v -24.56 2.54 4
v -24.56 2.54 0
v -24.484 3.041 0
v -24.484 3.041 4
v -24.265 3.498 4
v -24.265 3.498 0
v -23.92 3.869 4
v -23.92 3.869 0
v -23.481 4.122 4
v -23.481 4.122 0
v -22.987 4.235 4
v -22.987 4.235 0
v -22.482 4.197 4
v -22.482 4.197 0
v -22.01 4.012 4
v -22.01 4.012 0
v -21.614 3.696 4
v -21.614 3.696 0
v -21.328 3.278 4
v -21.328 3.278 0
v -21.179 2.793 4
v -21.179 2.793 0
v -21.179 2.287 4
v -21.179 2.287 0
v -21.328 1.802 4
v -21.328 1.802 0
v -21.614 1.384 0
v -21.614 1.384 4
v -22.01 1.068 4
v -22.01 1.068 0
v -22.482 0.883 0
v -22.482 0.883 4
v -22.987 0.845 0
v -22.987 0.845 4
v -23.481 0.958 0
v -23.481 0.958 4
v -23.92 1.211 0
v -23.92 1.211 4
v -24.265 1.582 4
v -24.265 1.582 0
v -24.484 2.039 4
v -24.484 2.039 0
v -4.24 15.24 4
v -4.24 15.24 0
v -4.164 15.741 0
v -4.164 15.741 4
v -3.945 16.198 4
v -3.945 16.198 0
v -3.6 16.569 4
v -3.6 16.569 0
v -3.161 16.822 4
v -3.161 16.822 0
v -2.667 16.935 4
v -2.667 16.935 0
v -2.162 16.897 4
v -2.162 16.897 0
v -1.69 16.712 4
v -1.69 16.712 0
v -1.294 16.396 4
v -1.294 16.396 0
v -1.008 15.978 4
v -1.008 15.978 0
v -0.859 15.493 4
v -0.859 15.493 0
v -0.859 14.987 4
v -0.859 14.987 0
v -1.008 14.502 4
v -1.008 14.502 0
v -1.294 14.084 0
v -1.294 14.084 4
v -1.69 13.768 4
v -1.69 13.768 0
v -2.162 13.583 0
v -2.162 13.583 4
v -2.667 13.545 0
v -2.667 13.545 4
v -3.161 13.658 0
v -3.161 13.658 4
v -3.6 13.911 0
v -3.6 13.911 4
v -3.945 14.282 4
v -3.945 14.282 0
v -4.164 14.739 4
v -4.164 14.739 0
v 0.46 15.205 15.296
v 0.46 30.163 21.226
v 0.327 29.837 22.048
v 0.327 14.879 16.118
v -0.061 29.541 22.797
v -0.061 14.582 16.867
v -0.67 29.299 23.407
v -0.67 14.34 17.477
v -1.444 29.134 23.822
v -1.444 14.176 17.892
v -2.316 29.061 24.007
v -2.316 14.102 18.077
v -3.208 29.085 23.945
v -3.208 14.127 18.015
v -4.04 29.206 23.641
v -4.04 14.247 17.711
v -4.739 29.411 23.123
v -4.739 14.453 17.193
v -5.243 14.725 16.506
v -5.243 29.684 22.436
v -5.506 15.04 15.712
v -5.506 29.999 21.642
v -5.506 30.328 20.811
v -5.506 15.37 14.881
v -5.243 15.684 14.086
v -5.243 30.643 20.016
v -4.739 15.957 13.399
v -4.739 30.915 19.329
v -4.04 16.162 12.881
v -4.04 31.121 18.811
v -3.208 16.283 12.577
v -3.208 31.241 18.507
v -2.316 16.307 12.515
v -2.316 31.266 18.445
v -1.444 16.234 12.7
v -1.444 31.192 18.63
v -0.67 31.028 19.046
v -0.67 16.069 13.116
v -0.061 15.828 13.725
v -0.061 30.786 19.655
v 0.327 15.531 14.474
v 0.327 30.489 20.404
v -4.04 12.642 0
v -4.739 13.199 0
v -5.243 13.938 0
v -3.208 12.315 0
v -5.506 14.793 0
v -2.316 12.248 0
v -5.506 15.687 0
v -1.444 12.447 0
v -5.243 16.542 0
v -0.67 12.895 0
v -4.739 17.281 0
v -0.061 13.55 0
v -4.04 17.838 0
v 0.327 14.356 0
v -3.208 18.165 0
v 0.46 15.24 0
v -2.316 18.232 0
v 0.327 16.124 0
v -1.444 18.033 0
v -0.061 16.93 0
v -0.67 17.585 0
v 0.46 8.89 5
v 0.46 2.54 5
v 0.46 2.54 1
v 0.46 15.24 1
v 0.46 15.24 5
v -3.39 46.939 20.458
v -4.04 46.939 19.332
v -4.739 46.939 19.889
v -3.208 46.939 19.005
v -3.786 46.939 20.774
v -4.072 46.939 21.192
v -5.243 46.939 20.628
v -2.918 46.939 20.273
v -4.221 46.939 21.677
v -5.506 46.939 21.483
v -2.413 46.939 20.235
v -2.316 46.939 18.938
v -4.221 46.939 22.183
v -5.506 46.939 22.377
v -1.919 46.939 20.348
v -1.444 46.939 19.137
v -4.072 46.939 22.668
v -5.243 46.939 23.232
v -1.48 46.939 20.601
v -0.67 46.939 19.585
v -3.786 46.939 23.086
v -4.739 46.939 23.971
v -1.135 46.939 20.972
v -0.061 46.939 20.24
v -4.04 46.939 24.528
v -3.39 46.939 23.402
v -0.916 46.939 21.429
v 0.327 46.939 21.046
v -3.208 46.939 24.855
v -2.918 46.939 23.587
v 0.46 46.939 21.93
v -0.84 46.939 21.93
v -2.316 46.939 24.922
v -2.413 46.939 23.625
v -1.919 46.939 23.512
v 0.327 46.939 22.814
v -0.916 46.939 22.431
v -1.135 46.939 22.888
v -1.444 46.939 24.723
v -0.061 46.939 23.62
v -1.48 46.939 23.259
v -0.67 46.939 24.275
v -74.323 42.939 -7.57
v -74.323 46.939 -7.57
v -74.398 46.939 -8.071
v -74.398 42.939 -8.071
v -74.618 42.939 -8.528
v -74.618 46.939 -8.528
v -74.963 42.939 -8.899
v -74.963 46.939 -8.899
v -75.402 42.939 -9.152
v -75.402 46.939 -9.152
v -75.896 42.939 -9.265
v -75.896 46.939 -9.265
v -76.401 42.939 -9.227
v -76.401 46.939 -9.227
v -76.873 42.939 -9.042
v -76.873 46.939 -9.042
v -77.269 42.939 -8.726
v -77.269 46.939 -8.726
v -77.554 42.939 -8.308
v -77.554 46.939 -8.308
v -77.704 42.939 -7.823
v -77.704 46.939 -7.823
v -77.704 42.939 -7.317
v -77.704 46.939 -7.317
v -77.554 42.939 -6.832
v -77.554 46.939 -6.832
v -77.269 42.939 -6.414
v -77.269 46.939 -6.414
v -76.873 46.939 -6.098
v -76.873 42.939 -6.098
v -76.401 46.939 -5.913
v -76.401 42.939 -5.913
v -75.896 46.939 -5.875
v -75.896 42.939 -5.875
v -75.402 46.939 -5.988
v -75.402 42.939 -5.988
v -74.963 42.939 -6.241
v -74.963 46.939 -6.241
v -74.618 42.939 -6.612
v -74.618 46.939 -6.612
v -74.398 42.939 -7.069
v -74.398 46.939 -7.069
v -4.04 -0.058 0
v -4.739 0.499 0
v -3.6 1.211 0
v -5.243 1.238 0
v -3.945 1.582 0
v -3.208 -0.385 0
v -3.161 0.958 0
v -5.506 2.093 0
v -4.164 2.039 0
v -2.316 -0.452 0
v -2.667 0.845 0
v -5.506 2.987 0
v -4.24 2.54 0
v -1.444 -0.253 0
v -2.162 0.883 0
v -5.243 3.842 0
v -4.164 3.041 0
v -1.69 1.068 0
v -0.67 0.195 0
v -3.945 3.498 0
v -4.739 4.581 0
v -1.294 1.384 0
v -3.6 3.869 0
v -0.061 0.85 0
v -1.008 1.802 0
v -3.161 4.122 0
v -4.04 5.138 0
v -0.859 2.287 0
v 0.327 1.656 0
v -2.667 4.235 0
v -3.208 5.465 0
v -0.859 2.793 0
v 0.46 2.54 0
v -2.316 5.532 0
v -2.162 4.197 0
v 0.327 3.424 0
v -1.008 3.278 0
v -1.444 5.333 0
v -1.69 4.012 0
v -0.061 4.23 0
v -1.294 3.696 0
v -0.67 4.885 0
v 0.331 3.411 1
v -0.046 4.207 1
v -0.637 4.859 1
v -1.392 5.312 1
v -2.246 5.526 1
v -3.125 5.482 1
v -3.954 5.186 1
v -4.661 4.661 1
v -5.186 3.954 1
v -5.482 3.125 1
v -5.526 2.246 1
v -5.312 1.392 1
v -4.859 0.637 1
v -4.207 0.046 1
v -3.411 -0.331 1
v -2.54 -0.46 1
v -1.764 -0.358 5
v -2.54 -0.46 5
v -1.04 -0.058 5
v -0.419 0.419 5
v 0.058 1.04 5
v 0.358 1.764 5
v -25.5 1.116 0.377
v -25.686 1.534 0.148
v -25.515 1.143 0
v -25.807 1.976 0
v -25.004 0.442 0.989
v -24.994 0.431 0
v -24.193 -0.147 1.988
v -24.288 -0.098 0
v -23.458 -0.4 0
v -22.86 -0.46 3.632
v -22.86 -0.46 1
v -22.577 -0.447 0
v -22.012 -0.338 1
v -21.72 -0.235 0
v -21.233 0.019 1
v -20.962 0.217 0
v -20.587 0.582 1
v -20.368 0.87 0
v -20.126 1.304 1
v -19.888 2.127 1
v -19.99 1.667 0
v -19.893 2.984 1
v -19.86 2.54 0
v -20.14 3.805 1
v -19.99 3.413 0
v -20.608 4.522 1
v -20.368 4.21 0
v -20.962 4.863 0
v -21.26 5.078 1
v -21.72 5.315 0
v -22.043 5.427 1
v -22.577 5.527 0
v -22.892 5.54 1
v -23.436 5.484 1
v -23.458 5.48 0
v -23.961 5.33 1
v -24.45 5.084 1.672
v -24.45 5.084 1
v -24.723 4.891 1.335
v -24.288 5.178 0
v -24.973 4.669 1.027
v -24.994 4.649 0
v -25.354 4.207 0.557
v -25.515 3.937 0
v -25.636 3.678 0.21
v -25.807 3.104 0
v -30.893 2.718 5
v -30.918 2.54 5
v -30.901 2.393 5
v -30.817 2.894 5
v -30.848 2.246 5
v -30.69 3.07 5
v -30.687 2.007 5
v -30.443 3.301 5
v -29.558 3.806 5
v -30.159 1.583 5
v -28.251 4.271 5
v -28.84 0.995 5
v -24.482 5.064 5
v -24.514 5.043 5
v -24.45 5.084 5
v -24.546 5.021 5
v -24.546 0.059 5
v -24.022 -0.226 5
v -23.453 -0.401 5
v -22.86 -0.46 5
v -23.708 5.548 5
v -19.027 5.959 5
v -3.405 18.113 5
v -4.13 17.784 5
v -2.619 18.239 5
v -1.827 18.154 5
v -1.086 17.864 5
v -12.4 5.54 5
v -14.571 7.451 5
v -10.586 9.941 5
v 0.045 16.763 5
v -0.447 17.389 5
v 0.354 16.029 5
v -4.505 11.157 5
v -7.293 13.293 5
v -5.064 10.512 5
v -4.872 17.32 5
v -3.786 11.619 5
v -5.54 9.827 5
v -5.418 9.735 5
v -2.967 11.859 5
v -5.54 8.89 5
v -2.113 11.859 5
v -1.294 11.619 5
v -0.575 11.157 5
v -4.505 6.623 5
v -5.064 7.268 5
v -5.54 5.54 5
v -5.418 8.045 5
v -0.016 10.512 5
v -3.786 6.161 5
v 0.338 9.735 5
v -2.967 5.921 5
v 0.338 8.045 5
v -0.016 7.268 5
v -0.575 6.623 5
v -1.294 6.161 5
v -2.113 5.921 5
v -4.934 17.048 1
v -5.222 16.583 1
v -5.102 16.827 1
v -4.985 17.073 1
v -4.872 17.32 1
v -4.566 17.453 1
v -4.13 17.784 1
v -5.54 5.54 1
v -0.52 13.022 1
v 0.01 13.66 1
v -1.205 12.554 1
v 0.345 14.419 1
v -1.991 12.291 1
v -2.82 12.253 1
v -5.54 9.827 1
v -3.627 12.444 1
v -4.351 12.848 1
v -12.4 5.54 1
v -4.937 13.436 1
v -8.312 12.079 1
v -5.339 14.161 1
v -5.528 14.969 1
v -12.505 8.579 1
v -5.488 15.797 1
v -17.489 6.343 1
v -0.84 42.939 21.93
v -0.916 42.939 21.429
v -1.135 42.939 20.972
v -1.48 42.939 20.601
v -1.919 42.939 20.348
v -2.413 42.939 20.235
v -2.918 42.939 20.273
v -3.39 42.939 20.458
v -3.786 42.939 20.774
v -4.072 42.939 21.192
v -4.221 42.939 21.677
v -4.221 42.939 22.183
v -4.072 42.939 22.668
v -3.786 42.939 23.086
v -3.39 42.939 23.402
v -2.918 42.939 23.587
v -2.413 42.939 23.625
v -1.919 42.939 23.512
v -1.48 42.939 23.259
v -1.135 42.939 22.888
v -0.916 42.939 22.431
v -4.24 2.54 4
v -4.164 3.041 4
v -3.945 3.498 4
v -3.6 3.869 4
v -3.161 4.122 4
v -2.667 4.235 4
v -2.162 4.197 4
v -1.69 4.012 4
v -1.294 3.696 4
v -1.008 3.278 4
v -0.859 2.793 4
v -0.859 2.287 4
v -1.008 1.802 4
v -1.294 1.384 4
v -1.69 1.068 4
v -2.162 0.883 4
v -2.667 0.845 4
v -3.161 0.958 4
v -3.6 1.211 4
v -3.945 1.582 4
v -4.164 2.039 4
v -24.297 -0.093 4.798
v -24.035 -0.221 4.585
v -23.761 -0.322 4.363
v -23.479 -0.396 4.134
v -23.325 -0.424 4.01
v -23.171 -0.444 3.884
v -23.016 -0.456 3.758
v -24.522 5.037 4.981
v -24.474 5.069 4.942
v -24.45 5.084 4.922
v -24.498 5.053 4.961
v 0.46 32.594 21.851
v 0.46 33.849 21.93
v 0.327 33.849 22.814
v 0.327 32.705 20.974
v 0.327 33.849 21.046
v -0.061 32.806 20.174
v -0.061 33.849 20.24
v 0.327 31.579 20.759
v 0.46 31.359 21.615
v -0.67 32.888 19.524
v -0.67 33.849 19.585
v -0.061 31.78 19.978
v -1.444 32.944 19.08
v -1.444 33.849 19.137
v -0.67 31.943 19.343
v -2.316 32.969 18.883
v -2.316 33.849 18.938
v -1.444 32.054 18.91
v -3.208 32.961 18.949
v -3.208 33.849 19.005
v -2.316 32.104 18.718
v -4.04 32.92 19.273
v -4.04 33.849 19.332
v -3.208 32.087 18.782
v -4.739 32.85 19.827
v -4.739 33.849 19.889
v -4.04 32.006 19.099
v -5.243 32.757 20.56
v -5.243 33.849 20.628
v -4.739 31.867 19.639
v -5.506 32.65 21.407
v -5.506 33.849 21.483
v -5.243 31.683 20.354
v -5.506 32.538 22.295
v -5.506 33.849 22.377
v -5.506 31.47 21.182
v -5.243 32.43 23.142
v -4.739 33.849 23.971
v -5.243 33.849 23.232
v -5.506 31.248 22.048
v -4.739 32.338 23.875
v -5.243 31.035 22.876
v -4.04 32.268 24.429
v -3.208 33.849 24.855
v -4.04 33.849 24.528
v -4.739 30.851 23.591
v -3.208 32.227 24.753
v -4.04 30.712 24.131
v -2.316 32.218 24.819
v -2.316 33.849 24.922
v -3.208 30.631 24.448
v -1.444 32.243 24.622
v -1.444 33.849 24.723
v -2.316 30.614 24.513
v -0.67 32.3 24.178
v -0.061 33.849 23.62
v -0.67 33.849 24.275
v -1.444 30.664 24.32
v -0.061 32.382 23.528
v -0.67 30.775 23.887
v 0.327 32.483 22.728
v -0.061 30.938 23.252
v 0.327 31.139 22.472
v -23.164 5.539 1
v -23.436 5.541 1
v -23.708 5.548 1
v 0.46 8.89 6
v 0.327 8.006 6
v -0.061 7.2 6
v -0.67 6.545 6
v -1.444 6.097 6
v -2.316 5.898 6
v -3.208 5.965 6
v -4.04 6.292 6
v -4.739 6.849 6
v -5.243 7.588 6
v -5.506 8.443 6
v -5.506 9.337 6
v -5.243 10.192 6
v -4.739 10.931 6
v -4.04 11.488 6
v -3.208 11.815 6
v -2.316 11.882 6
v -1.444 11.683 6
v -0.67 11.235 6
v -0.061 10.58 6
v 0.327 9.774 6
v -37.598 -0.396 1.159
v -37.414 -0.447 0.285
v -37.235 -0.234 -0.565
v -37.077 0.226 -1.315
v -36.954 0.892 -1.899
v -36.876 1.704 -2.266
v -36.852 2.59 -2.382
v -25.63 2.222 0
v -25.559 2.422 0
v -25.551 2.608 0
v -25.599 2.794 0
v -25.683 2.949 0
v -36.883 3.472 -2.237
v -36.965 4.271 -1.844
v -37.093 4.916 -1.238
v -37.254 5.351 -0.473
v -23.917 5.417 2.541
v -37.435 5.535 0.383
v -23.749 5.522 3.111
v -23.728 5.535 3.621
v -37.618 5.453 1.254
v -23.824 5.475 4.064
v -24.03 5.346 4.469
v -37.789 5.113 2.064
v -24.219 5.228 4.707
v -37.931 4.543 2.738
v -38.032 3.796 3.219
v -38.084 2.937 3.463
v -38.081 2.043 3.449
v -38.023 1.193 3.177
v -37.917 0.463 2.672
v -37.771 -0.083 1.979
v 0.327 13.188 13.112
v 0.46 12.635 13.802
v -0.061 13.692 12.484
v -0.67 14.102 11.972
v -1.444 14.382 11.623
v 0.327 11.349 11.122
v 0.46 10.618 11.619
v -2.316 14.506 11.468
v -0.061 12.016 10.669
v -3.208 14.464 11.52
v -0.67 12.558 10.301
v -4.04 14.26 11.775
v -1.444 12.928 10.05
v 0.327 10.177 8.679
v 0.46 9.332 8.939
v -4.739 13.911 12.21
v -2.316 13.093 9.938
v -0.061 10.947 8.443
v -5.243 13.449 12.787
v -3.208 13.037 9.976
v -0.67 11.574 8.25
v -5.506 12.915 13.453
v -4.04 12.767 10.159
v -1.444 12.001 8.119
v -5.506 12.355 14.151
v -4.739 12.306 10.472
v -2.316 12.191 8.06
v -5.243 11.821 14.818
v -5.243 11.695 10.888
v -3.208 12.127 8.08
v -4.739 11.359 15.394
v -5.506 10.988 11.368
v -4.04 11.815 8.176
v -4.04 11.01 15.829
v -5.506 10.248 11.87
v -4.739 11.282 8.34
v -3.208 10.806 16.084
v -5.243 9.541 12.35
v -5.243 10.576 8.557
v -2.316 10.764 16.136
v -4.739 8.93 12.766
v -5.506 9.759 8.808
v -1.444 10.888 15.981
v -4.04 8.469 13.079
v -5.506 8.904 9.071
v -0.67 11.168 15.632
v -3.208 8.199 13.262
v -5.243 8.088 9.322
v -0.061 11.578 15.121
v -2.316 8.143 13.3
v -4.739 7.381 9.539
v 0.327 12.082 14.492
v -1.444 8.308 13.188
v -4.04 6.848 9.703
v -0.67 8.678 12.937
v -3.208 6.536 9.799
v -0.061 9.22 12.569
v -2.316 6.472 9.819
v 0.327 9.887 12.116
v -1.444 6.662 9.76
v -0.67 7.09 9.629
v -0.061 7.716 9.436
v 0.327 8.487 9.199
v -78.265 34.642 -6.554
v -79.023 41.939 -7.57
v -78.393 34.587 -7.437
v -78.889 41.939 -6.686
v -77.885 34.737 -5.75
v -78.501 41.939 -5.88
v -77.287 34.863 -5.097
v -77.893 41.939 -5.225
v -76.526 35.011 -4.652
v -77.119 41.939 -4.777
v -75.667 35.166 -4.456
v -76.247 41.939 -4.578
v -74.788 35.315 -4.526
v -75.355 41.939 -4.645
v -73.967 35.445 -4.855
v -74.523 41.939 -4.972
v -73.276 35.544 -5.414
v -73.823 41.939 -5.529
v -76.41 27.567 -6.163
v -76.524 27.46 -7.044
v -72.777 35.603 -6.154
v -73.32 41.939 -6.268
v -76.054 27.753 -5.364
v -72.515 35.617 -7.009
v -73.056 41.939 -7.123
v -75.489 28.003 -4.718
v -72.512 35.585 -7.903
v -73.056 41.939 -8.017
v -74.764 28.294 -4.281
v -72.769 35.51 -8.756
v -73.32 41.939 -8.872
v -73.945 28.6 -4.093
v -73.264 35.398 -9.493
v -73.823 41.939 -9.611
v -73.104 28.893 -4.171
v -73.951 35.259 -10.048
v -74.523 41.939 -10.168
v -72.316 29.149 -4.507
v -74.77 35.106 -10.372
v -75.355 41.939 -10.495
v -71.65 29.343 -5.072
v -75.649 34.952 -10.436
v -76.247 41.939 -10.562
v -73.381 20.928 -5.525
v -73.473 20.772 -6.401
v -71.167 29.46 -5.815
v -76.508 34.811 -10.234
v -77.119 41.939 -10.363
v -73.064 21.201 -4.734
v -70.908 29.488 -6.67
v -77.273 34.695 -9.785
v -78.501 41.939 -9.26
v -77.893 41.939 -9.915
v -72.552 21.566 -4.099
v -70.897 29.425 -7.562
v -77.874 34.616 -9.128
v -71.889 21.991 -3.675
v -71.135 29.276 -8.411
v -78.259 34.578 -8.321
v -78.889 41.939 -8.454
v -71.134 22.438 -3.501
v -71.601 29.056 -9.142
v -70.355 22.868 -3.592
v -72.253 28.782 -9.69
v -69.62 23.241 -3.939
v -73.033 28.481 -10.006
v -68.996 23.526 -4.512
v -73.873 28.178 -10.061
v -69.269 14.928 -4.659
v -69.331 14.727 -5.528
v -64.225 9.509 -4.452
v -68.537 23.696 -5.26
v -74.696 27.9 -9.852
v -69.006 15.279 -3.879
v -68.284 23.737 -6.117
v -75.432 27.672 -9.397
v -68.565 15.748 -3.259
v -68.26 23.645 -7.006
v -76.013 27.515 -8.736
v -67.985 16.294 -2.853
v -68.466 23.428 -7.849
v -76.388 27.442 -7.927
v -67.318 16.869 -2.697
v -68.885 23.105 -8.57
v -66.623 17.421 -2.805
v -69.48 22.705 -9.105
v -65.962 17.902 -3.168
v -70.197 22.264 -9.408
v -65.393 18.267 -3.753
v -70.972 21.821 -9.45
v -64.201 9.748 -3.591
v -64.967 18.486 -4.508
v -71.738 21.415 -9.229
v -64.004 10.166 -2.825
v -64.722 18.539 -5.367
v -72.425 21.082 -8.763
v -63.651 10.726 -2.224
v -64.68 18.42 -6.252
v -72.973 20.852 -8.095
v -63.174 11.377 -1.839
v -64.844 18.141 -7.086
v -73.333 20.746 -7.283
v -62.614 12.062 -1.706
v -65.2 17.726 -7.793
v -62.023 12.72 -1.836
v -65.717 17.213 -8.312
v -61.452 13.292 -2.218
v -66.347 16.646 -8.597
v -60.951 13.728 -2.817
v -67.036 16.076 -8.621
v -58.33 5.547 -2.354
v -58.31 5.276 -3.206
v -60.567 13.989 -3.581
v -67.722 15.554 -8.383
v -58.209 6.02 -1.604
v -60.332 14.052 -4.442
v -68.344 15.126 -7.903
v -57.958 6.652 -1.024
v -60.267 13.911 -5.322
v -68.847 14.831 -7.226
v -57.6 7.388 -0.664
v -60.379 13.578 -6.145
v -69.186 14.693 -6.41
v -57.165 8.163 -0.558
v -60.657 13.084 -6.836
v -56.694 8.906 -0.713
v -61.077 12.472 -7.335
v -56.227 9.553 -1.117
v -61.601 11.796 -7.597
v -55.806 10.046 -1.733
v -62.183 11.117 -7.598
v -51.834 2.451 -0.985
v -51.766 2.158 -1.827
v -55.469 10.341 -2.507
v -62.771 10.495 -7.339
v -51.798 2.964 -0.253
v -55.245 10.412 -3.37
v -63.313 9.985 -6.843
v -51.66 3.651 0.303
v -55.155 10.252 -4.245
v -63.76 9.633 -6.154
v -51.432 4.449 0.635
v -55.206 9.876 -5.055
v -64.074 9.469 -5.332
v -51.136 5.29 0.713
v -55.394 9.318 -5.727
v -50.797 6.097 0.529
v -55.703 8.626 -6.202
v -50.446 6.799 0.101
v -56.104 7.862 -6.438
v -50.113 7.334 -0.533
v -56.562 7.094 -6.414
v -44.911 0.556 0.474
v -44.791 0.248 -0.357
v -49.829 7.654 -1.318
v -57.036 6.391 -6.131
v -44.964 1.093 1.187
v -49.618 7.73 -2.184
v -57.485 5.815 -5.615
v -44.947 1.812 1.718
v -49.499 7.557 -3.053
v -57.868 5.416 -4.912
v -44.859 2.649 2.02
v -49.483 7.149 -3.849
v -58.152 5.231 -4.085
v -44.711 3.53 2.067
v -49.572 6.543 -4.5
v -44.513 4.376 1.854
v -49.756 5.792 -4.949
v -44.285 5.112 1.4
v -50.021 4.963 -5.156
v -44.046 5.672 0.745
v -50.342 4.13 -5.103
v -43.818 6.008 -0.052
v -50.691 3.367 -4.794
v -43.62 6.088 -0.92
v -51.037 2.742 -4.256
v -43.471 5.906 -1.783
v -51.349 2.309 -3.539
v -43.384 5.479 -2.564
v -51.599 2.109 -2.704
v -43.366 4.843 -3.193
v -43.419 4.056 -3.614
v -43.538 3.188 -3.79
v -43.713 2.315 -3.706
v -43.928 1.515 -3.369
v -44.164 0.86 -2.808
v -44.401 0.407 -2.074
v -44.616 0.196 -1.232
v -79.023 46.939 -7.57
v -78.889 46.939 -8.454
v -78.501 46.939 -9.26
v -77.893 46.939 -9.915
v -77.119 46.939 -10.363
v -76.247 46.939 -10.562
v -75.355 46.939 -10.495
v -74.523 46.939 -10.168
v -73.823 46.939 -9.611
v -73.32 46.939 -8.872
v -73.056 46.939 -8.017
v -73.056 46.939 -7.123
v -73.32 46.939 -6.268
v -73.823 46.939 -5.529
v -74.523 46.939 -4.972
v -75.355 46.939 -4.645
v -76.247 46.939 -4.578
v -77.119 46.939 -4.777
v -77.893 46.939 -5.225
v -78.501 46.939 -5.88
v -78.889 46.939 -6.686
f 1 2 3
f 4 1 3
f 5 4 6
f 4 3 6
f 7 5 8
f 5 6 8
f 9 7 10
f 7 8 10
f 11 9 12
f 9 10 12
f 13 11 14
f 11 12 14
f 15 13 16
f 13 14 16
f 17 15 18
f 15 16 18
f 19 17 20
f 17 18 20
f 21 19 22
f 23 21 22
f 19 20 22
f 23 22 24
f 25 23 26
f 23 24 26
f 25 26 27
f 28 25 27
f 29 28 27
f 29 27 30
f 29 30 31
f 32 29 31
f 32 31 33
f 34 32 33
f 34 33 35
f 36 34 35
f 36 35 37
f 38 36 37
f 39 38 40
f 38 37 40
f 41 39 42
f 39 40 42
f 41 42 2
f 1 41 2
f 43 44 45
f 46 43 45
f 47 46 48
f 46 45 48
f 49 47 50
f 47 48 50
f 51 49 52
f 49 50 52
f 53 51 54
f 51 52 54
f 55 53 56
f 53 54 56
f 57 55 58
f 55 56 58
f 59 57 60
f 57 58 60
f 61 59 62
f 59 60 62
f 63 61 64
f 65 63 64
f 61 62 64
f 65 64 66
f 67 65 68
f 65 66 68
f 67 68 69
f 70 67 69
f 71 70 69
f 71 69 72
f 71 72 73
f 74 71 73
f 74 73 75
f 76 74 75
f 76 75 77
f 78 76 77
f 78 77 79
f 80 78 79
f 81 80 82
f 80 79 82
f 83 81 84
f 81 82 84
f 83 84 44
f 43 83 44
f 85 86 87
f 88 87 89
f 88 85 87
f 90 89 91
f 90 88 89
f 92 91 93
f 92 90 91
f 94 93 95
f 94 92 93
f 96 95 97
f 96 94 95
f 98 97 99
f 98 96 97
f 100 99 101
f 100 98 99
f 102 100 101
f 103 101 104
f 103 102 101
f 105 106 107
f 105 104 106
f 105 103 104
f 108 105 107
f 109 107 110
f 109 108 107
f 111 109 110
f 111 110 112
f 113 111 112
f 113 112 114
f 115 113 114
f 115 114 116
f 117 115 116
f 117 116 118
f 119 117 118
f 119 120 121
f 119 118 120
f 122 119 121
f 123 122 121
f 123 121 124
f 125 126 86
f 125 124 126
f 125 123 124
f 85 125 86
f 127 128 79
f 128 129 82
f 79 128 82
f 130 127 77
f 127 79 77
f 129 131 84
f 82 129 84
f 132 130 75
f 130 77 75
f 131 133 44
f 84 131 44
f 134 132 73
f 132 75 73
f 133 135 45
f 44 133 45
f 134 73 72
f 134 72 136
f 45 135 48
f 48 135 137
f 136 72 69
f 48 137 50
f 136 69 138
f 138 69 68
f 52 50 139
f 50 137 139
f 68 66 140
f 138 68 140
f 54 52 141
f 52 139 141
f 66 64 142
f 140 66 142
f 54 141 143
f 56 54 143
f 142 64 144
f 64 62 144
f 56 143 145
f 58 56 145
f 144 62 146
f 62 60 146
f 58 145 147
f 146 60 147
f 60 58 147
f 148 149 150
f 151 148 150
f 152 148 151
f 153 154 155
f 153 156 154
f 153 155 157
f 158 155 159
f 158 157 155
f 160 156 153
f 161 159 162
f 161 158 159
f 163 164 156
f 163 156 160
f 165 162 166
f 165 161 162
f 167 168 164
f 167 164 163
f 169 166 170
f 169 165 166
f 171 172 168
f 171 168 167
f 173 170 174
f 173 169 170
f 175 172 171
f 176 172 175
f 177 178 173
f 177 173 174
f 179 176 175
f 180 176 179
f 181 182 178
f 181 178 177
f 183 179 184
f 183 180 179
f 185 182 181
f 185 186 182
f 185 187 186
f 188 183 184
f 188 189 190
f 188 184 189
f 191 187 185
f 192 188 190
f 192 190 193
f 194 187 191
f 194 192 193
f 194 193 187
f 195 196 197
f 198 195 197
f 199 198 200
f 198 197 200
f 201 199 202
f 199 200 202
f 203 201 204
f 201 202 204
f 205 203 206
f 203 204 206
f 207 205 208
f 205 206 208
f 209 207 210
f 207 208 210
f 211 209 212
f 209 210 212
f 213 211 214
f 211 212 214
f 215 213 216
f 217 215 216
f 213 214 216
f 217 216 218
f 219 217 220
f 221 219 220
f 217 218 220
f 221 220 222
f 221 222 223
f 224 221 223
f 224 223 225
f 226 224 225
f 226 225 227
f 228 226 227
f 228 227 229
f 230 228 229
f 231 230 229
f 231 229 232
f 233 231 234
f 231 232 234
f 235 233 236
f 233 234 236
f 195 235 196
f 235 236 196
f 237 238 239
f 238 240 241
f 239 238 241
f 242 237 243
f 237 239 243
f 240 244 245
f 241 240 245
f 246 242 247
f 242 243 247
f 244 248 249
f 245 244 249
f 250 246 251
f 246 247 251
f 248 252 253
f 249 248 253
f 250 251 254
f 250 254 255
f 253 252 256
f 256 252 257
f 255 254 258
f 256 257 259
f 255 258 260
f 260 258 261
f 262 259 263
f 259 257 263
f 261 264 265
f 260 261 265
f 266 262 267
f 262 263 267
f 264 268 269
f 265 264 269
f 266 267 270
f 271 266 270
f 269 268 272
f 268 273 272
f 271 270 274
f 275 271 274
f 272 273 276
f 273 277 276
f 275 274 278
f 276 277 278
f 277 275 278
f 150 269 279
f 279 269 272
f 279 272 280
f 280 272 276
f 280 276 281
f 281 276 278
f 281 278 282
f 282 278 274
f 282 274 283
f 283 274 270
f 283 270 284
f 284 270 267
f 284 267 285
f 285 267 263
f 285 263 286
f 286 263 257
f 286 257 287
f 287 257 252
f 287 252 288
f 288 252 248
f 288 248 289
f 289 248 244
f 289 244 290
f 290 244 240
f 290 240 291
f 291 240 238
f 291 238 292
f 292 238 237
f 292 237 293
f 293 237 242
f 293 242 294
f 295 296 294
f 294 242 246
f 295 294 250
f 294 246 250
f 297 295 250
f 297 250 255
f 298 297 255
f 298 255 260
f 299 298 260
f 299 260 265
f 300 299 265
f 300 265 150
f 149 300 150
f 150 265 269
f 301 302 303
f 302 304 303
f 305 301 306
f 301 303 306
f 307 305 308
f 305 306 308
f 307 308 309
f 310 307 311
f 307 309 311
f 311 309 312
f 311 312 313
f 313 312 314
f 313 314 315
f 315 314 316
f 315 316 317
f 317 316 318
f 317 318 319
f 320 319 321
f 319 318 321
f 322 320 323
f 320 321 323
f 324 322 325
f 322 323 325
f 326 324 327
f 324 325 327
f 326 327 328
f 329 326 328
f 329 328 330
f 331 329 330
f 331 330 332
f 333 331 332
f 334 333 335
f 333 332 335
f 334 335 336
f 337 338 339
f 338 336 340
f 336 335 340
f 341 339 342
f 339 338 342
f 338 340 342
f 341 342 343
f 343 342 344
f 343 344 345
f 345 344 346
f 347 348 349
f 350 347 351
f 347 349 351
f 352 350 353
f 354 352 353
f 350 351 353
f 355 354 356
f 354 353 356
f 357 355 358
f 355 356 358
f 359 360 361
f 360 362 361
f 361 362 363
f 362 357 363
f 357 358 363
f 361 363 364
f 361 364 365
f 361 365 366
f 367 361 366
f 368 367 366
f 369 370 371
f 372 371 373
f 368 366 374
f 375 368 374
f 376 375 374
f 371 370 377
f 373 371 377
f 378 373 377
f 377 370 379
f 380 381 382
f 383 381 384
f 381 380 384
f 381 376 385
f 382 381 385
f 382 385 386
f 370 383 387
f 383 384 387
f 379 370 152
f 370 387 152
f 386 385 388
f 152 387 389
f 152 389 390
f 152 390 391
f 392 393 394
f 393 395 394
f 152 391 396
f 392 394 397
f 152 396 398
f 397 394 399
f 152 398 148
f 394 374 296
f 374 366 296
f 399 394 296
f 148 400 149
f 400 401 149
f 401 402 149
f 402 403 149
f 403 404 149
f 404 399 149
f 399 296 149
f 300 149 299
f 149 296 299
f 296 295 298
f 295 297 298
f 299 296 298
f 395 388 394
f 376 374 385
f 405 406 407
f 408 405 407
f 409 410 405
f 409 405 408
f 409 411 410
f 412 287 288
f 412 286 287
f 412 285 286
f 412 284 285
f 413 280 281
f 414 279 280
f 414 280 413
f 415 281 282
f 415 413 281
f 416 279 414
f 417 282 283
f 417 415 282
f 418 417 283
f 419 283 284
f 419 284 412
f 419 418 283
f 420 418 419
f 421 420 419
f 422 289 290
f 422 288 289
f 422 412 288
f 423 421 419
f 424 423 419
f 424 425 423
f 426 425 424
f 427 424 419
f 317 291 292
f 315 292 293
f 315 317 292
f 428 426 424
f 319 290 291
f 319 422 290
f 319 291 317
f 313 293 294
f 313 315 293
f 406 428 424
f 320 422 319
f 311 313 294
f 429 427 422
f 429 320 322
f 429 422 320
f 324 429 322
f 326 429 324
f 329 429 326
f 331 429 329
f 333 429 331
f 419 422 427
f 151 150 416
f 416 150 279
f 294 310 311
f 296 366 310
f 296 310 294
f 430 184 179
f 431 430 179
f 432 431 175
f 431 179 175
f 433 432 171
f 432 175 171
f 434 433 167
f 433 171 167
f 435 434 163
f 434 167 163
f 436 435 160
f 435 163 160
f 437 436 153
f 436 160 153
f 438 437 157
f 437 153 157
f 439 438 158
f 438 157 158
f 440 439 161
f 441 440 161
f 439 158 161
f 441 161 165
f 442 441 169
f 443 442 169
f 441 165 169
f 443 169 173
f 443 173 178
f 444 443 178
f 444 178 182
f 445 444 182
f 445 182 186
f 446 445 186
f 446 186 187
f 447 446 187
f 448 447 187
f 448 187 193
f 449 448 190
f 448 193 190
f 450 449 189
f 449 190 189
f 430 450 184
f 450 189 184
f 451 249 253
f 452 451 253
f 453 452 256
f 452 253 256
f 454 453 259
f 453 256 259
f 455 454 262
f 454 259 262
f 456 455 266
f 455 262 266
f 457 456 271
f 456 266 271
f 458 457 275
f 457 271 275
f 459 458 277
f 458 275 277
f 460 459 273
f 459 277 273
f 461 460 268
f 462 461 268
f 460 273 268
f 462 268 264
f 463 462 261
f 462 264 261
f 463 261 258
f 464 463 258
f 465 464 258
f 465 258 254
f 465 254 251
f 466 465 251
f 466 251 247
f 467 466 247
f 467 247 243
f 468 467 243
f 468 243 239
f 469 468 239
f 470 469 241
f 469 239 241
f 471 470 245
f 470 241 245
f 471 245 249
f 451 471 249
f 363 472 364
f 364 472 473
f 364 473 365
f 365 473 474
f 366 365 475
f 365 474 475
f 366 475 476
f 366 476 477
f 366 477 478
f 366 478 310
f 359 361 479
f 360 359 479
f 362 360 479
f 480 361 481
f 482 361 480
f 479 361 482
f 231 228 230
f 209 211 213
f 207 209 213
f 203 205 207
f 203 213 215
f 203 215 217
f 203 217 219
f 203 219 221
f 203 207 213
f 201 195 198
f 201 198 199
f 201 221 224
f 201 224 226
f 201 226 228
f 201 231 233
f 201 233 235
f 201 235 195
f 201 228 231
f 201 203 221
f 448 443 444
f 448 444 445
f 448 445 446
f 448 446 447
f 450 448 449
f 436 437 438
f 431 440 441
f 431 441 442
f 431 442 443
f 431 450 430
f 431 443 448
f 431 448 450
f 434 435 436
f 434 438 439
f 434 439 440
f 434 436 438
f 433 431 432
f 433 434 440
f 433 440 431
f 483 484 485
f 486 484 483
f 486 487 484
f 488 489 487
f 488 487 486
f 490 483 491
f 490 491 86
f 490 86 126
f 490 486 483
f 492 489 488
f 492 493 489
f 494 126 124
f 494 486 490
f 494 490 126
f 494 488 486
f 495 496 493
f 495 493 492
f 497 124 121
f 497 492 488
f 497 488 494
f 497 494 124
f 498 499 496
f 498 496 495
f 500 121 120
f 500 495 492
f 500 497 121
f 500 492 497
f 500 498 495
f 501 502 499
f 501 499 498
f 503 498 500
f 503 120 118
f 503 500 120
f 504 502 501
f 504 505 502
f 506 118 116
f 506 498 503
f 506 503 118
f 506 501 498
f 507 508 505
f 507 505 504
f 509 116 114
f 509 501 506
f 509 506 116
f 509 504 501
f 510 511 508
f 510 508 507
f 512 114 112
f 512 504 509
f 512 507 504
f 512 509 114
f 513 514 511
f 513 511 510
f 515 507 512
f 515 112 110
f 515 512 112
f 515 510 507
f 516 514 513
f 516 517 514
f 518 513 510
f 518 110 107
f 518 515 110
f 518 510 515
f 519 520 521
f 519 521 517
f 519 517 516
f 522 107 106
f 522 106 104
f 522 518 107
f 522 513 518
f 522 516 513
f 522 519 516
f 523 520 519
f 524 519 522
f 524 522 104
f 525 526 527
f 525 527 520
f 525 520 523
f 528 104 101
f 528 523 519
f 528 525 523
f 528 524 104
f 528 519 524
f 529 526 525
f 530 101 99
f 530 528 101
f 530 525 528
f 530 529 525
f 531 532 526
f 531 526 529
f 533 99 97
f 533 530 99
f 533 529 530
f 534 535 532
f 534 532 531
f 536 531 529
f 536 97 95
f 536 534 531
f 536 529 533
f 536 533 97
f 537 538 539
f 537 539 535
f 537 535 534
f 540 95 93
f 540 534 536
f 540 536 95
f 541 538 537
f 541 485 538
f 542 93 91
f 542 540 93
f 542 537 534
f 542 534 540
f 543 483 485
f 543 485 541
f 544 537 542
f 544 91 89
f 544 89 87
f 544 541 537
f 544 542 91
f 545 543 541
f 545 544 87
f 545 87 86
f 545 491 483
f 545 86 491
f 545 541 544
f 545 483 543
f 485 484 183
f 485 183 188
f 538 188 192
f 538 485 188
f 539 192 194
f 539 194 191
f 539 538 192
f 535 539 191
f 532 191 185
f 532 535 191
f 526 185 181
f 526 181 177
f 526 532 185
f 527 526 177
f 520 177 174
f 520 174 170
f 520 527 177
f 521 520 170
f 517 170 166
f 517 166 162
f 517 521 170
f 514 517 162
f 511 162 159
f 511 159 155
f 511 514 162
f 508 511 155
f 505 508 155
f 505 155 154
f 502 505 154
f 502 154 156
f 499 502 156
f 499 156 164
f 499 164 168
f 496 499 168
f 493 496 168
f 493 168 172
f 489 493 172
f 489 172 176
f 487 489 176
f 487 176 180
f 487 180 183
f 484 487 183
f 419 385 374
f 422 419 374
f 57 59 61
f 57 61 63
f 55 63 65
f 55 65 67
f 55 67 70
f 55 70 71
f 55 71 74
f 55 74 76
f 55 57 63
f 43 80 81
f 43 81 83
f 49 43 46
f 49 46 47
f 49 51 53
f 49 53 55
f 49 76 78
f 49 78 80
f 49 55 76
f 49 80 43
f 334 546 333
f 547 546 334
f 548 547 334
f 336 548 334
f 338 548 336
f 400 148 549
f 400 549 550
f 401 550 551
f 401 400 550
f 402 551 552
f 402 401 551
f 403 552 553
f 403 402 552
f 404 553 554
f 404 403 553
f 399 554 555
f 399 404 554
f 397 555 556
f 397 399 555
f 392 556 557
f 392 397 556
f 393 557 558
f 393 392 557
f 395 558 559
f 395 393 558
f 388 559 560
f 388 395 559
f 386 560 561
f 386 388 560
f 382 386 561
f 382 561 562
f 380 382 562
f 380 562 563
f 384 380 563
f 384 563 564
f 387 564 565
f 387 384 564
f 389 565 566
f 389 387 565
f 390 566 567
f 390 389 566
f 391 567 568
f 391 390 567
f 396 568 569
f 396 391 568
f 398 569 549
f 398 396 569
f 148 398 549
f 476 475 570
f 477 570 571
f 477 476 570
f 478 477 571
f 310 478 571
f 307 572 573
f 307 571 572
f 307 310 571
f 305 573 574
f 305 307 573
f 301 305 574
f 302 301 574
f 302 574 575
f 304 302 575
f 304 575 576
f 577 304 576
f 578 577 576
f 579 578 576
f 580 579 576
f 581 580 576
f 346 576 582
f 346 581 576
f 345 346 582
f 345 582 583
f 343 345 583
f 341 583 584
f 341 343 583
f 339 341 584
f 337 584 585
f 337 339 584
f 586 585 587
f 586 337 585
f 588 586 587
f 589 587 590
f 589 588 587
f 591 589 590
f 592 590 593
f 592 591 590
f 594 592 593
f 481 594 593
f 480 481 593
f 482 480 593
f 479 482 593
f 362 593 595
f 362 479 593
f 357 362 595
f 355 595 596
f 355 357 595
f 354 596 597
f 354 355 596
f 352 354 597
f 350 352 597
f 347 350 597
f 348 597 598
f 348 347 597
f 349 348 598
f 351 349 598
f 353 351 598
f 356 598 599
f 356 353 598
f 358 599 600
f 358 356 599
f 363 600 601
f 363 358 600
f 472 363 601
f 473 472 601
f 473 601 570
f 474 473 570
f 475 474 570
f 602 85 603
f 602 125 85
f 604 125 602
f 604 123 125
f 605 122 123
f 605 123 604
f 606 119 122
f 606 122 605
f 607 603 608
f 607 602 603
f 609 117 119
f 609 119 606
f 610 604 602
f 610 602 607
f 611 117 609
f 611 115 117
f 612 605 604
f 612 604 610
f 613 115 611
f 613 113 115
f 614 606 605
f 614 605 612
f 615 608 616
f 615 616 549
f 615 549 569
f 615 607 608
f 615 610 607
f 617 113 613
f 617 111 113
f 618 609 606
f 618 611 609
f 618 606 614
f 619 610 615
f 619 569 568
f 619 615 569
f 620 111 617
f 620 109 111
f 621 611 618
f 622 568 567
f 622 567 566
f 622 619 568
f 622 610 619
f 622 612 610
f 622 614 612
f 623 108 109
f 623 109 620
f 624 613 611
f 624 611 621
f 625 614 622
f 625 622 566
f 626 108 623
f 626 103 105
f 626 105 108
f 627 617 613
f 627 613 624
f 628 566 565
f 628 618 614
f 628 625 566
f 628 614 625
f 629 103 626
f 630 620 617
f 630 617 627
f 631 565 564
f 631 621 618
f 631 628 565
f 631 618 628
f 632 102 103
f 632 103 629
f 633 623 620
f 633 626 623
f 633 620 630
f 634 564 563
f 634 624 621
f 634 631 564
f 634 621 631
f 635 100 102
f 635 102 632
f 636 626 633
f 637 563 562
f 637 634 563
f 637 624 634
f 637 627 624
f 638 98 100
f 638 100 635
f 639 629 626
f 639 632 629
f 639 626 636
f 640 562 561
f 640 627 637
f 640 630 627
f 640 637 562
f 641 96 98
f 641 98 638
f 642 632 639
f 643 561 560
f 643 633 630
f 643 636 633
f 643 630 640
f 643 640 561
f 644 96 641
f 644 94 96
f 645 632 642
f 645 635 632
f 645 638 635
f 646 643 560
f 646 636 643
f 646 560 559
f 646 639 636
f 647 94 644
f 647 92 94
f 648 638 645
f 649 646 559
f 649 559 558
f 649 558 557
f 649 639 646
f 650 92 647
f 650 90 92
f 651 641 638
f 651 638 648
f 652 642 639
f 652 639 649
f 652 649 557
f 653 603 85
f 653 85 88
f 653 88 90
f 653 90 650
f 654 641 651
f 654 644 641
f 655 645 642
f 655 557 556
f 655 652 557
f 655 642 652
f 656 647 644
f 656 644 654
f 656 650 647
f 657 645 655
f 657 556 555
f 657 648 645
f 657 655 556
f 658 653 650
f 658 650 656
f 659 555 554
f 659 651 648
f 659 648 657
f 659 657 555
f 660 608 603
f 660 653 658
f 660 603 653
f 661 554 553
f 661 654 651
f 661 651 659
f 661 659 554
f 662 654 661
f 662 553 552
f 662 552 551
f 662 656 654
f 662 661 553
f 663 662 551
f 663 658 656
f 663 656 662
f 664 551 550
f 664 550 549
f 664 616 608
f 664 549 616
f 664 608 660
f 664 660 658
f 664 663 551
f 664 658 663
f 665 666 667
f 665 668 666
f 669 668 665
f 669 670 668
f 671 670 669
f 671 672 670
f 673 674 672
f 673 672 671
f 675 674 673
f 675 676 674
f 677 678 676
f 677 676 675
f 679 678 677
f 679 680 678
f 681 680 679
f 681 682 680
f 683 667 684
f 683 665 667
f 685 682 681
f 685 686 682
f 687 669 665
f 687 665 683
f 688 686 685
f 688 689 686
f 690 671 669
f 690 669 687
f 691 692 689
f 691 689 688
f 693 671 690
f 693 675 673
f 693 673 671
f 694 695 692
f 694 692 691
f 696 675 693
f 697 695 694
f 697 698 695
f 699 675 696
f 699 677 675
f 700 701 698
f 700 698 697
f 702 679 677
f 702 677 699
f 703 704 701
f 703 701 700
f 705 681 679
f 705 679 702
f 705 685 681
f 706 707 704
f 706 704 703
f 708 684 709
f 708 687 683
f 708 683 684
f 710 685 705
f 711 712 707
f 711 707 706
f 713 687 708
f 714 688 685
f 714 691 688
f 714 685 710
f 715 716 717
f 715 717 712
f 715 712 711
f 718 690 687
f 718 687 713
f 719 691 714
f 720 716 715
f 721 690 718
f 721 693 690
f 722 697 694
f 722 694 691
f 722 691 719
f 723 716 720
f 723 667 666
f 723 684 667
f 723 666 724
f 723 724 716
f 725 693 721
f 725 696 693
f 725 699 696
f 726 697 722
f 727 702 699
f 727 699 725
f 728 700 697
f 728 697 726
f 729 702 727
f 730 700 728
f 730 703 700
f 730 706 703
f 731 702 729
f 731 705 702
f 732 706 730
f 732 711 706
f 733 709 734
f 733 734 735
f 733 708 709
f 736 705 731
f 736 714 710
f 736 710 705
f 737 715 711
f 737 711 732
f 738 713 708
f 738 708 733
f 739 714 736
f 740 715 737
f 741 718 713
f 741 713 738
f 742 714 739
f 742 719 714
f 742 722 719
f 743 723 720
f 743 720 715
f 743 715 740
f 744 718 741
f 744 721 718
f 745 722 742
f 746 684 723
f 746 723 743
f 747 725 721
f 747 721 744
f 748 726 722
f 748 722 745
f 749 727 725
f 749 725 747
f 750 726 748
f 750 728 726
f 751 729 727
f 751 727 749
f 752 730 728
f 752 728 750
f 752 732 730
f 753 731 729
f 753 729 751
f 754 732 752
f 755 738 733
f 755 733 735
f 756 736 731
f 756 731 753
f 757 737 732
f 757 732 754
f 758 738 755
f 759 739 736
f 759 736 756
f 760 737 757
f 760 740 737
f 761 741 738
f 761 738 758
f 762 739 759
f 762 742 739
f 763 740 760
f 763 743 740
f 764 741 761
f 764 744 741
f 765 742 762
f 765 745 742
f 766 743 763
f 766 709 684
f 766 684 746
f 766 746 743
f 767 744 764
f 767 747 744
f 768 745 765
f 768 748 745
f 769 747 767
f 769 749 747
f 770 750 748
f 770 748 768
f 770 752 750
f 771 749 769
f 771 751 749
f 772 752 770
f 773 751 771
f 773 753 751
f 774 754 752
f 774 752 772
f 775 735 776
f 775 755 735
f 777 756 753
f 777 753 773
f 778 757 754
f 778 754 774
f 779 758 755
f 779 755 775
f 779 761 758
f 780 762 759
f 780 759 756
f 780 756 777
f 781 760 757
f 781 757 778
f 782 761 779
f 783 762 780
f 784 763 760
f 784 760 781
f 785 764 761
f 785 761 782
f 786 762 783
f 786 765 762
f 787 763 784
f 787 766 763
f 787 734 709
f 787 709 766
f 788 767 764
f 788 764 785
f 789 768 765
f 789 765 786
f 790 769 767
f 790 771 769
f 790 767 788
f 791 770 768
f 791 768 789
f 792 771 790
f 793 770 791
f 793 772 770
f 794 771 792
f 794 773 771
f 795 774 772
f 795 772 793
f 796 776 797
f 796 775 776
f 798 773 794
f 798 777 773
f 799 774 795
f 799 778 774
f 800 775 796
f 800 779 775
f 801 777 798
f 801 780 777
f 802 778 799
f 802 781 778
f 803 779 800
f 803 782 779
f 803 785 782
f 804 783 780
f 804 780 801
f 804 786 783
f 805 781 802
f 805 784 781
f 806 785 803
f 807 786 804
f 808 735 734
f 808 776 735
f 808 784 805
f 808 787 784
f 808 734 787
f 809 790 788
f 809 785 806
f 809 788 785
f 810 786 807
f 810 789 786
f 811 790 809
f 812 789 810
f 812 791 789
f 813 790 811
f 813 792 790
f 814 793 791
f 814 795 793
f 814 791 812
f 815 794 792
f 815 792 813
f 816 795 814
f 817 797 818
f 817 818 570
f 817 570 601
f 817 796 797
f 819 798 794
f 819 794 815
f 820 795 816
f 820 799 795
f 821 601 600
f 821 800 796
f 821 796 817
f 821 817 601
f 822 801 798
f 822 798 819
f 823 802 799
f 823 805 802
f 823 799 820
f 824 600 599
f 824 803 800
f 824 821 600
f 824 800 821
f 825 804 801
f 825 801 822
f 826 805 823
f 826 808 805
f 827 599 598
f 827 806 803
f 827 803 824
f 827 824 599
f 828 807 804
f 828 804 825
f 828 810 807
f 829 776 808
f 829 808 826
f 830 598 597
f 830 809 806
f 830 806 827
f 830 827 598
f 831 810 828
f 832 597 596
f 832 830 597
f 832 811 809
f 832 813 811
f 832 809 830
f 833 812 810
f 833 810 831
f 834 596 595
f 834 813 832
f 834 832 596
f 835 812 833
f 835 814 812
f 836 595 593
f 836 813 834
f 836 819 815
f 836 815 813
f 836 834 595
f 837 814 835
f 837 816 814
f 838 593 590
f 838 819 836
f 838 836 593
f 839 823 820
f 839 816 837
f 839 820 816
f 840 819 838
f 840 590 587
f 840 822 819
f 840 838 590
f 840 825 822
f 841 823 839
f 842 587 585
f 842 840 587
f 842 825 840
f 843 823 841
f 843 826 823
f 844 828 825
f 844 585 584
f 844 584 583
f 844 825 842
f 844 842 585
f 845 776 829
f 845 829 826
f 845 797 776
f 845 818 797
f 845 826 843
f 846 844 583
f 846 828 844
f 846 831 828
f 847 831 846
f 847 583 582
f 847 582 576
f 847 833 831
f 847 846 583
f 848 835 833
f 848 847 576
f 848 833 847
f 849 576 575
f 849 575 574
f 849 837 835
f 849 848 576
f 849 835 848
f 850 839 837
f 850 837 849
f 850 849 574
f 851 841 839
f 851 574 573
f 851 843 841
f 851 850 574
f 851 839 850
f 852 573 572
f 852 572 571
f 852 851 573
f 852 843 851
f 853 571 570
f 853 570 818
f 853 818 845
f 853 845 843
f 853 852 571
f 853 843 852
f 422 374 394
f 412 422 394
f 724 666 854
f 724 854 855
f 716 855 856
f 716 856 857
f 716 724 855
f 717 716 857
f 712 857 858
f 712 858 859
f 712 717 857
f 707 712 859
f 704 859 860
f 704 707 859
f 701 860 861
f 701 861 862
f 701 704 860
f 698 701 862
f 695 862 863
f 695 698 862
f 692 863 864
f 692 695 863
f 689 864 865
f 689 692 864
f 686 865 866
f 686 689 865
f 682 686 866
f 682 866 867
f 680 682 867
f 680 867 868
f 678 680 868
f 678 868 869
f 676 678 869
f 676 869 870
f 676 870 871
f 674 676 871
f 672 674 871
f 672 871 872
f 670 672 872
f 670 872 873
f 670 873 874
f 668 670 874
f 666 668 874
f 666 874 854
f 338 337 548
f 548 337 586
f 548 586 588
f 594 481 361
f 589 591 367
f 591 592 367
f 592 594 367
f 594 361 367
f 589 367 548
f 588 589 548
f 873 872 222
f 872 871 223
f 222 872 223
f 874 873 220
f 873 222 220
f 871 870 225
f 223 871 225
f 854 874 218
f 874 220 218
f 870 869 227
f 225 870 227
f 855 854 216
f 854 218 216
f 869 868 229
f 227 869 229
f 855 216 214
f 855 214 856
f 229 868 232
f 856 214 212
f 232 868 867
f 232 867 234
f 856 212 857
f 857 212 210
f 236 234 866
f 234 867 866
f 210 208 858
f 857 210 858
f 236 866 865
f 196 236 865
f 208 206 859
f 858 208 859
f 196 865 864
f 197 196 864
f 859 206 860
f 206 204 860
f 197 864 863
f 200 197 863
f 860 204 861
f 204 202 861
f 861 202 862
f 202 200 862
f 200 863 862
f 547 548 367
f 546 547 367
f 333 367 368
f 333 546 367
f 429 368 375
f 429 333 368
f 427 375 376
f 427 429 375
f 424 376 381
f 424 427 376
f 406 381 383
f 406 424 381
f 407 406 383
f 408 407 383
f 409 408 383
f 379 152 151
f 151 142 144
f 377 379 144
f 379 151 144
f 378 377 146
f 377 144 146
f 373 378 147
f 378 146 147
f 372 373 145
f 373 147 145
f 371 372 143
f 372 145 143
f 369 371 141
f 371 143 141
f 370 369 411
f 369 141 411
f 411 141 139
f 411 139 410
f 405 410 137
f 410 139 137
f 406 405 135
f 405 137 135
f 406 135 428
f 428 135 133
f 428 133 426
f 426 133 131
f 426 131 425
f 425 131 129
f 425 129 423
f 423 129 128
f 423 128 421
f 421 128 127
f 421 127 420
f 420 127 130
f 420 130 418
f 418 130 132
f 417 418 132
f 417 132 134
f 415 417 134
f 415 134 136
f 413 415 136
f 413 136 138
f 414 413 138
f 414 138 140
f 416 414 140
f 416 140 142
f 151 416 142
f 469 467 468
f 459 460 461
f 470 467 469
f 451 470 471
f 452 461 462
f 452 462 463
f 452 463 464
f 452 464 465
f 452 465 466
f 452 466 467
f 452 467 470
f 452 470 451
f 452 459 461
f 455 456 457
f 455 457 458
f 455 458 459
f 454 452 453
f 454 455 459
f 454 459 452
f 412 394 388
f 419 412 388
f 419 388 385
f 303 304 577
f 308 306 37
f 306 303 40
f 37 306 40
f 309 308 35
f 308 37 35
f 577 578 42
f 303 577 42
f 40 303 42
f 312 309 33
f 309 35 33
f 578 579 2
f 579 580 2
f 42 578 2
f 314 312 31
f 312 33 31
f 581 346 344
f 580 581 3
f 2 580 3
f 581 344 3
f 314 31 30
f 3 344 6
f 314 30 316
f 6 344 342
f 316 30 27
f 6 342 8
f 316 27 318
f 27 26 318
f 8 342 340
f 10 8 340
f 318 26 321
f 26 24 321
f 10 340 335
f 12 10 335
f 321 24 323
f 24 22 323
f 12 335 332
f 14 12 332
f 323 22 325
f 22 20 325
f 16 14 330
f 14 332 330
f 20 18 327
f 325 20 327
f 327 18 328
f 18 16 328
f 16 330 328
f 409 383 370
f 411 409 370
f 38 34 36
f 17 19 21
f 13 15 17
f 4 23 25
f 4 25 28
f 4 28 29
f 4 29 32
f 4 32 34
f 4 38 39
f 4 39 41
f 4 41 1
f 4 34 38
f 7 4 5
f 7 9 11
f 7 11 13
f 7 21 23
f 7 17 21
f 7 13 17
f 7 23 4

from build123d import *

# Parameters (mm, degrees)
SKIZZE1_R                         = 3
AUFSATZ_LINEAR_AUSTRAGEN1_DEPTH   = 5
AUFSATZ_LINEAR_AUSTRAGEN1_2_DEPTH = 5
AUFSATZ_LINEAR_AUSTRAGEN1_3_DEPTH = 5
SKIZZE3_R                         = 3
SKIZZE6_W                         = 20.32
SKIZZE6_H                         = 6
AUFSATZ_LINEAR_AUSTRAGEN2_DEPTH   = 4
AUFSATZ_LINEAR_START              = -5
SKIZZE8_W                         = 6
SKIZZE8_H                         = 12.7
AUFSATZ_LINEAR_AUSTRAGEN3_DEPTH   = 4
AUFSATZ_LINEAR_AUSTRAGEN4_DEPTH   = 4
SKIZZE14_R                        = 3
SCHNITT_LINEAR_AUSTRAGEN2_DEPTH   = 48.39873951
SKIZZE16_R                        = 1.7
SCHNITT_LINEAR_AUSTRAGEN3_DEPTH   = 4
SKIZZE17_R                        = 1.7
SCHNITT_LINEAR_AUSTRAGEN4_DEPTH   = 4
SCHNITT_LINEAR_AUSTRAGEN6_DEPTH   = 4


with BuildPart() as part:
    # Skizze1 → Aufsatz-Linear austragen1 (new body)
    with BuildSketch(Plane.XY):
        with Locations((-2.54, 15.24)):
            Circle(SKIZZE1_R)
    extrude(amount=AUFSATZ_LINEAR_AUSTRAGEN1_DEPTH)



with BuildPart() as body_2:
    # Skizze1 → Aufsatz-Linear austragen1 2 (new body)
    with BuildSketch(Plane.XY):
        with Locations((-2.54, 2.54)):
            Circle(SKIZZE1_R)
    extrude(amount=AUFSATZ_LINEAR_AUSTRAGEN1_2_DEPTH)



with BuildPart() as body_3:
    # Skizze1 → Aufsatz-Linear austragen1 3 (new body)
    with BuildSketch(Plane.XY):
        with Locations((-22.86, 2.54)):
            Circle(SKIZZE1_R)
    extrude(amount=AUFSATZ_LINEAR_AUSTRAGEN1_3_DEPTH)


with BuildPart() as body_4:
    # Austragung1: sweep along a path in Skizze2
    with BuildLine(Plane(origin=(0, 0, 0), x_dir=(0, 0, -1), z_dir=(1, 0, 0))) as austragung1_path:
        Line((-21.93, 46.93873951), (-21.93, 33.848580958))
        ThreePointArc((-21.93, 33.848580958), (-21.752467402, 31.972645421), (-21.226173172, 30.163317826))
        Line((-21.226173172, 30.163317826), (-15.296173172, 15.204736868))
        ThreePointArc((-15.296173172, 15.204736868), (-11.619046569, 10.617979953), (-6, 8.89))
        Line((-6, 8.89), (-5, 8.89))
    # Skizze3 → Austragung1 (sweep)
    with BuildSketch(Plane.XY.offset(5)):
        with Locations((-2.54, 8.89)):
            Circle(SKIZZE3_R)
    sweep(path=austragung1_path.line)


with BuildPart() as body_2_1:
    add(body_2.part)

    add(body_3.part)  # Aufsatz-Linear austragen2 merges body 3
    # Skizze6 → Aufsatz-Linear austragen2 (add)
    with BuildSketch(Plane.XY.offset(5)):
        with Locations((-12.7, 2.54)):
            Rectangle(SKIZZE6_W, SKIZZE6_H)
    extrude(amount=-AUFSATZ_LINEAR_AUSTRAGEN2_DEPTH)


with BuildPart() as part_1:
    add(part.part)

    add(body_2_1.part)  # Aufsatz-Linear austragen3 merges body 2

    add(body_4.part)  # Aufsatz-Linear austragen3 merges body 4
    # Skizze8 → Aufsatz-Linear austragen3 (add)
    with BuildSketch(Plane(origin=(0, 0, 0), x_dir=(-1, 0, 0), z_dir=(0, 0, -1)).offset(AUFSATZ_LINEAR_START)):
        with Locations((2.54, 8.89)):
            Rectangle(SKIZZE8_W, SKIZZE8_H)
    extrude(amount=AUFSATZ_LINEAR_AUSTRAGEN3_DEPTH)

    # Skizze9 → Aufsatz-Linear austragen4 (add)
    with BuildSketch(Plane(origin=(0, 0, 0), x_dir=(-1, 0, 0), z_dir=(0, 0, -1)).offset(AUFSATZ_LINEAR_START)):
        Polygon((4.12999682, 17.783994912), (0.95000318, 12.696005088), (21.27000318, -0.003994912), (24.44999682, 5.083994912), align=None)
    extrude(amount=AUFSATZ_LINEAR_AUSTRAGEN4_DEPTH)

    # Austragung3: sweep along a path in Skizze12
    with BuildLine(Plane(origin=(-70.149644345, 31.847131815, -6.332474017), x_dir=(0.978512631, 0, 0.206186883), z_dir=(0.206186883, 0, -0.978512631))) as austragung3_path:
        Line((-6.001962715, -15.091607694), (-6.001962715, -10.091607694))
        ThreePointArc((-6.001962715, -10.091607694), (5.537660917, 17.767508183), (33.396776795, 29.307131815))
        Line((33.396776795, 29.307131815), (44.6436495, 29.307131815))
        Line((44.6436495, 29.307131815), (59.6436495, 29.307131815))
    # Skizze14 → Austragung3 (sweep)
    with BuildSketch(Plane(origin=(0, 46.93873951, 0), x_dir=(-1, 0, 0), z_dir=(0, -1, 0))):
        with Locations((76.022640673, 7.57)):
            Circle(SKIZZE14_R)
    sweep(path=austragung3_path.line)

    # Skizze15 → Schnitt-Linear austragen2 (cut, through all)
    with BuildSketch(Plane(origin=(0, -0.46, 0), x_dir=(-1, 0, 0), z_dir=(0, -1, 0))):
        Polygon((11.584184705, -5), (12.406140588, -8.900802043), (30.918395198, -5), align=None)
    extrude(amount=-SCHNITT_LINEAR_AUSTRAGEN2_DEPTH, mode=Mode.SUBTRACT)

    # Skizze16 → Schnitt-Linear austragen3 (cut)
    with BuildSketch(Plane(origin=(0, 46.93873951, 0), x_dir=(1, 0, 0), z_dir=(0, 1, 0))):
        with Locations((-2.54, -21.93)):
            Circle(SKIZZE16_R)
        with Locations((-76.022640673, 7.57)):
            Circle(SKIZZE16_R)
    extrude(amount=-SCHNITT_LINEAR_AUSTRAGEN3_DEPTH, mode=Mode.SUBTRACT)

    # Skizze17 → Schnitt-Linear austragen4 (cut)
    with BuildSketch(Plane(origin=(0, 0, 0), x_dir=(-1, 0, 0), z_dir=(0, 0, -1))):
        with Locations((2.54, 2.54)):
            Circle(SKIZZE17_R)
        with Locations((2.54, 15.24)):
            Circle(SKIZZE17_R)
        with Locations((22.86, 2.54)):
            Circle(SKIZZE17_R)
    extrude(amount=-SCHNITT_LINEAR_AUSTRAGEN4_DEPTH, mode=Mode.SUBTRACT)

    # Skizze19 → Schnitt-Linear austragen6 (cut)
    with BuildSketch(Plane(origin=(0, 0, 1), x_dir=(-1, 0, 0), z_dir=(0, 0, -1))):
        with BuildLine():
            Line((4.872034586, 17.320221308), (23.707959054, 5.547768516))
            ThreePointArc((23.707959054, 5.547768516), (12.505452744, 8.57872439), (4.872034586, 17.320221308))
        make_face()
    extrude(amount=-SCHNITT_LINEAR_AUSTRAGEN6_DEPTH, mode=Mode.SUBTRACT)


solid = part_1.part
